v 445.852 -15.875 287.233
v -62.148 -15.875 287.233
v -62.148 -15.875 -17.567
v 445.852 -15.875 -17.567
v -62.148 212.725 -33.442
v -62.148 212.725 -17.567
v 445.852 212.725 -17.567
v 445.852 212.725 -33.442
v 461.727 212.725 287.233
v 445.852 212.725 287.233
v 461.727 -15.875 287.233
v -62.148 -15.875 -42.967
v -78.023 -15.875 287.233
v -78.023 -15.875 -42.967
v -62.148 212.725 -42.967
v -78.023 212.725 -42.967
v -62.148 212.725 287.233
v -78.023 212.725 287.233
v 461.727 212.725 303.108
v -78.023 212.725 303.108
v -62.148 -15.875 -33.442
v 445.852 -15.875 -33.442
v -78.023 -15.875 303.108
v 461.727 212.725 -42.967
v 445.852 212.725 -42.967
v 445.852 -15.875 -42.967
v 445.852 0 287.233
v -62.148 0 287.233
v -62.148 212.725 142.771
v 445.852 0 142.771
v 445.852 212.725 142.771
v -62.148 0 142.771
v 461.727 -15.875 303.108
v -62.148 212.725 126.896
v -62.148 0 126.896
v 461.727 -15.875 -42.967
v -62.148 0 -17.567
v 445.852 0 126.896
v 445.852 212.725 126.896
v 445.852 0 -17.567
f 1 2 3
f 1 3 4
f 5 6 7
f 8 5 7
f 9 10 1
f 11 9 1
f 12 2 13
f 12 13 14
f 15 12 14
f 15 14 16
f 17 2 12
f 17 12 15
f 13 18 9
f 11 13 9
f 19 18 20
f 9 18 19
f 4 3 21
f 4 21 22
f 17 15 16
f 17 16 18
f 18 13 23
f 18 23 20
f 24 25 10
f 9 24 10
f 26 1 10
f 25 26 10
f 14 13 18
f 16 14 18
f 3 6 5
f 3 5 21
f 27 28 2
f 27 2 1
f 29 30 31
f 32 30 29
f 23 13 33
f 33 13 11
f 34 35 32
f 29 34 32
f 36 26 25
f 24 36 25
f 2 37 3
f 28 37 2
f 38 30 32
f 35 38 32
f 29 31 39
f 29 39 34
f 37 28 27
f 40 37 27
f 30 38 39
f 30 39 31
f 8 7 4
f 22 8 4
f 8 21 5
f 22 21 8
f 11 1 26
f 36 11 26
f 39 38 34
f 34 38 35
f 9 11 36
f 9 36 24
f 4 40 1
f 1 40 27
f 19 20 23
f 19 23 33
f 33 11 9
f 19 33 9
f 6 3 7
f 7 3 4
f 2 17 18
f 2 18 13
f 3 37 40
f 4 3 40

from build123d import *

# Parameters (mm, degrees)
F0_W      = 508
F0_H      = 304.8
F1_DEPTH  = 15.875
F2_W      = 15.875
F2_H      = 304.8
F3_DEPTH  = 15.875
F9_W      = 539.75
F9_H      = 228.6
F10_DEPTH = 15.875
F11_W     = 508
F11_H     = 228.6
F12_DEPTH = 15.875
F13_W     = 508
F13_H     = 15.875
F14_DEPTH = 212.725


with BuildPart() as f1:
    # F0 (on Front) → F1 (new body)
    with BuildSketch(Plane.XZ):
        with Locations((191.8520101309, 134.8332278222)):
            Rectangle(F0_W, F0_H)
    extrude(amount=F1_DEPTH)


with BuildPart() as f3:
    # F2 (on face) → F3 (new body)
    with BuildSketch(Plane.YZ.offset(445.8520101309)):
        Polygon((212.725, 287.2332278222), (0, 287.2332278222), (0, -17.5667721778), (-15.875, -17.5667721778), (-15.875, -42.9667721778), (212.725, -42.9667721778), align=None)
        with Locations((-7.9375, 134.8332278222)):
            Rectangle(F2_W, F2_H)
    extrude(amount=F3_DEPTH)


with BuildPart() as f8_1:
    # F8: instance of F3
    add(f3.part.mirror(Plane(origin=(191.8520101309, -15.875, 287.2332278222), x_dir=(0, 1, 0), z_dir=(1, 0, 0))))


with BuildPart() as f10:
    # F9 (on face) → F10 (new body)
    with BuildSketch(Plane.XY.offset(287.2332278222)):
        with Locations((191.8520101309, 98.425)):
            Rectangle(F9_W, F9_H)
    extrude(amount=F10_DEPTH)


with BuildPart() as f12:
    # F11 (on face) → F12 (new body)
    with BuildSketch(Plane(origin=(0, 0, -17.5667721778), x_dir=(1, 0, 0), z_dir=(0, 0, -1))):
        with Locations((191.8520101309, -98.425)):
            Rectangle(F11_W, F11_H)
    extrude(amount=F12_DEPTH)


with BuildPart() as f14:
    # F13 (on face) → F14 (new body, through all)
    with BuildSketch(Plane(origin=(0, 0, 0), x_dir=(-1, 0, 0), z_dir=(0, 1, 0))):
        with Locations((-191.8520101309, 134.8332278222)):
            Rectangle(F13_W, F13_H)
    extrude(amount=F14_DEPTH)


solid = Compound([f1.part, f3.part, f8_1.part, f10.part, f12.part, f14.part])
